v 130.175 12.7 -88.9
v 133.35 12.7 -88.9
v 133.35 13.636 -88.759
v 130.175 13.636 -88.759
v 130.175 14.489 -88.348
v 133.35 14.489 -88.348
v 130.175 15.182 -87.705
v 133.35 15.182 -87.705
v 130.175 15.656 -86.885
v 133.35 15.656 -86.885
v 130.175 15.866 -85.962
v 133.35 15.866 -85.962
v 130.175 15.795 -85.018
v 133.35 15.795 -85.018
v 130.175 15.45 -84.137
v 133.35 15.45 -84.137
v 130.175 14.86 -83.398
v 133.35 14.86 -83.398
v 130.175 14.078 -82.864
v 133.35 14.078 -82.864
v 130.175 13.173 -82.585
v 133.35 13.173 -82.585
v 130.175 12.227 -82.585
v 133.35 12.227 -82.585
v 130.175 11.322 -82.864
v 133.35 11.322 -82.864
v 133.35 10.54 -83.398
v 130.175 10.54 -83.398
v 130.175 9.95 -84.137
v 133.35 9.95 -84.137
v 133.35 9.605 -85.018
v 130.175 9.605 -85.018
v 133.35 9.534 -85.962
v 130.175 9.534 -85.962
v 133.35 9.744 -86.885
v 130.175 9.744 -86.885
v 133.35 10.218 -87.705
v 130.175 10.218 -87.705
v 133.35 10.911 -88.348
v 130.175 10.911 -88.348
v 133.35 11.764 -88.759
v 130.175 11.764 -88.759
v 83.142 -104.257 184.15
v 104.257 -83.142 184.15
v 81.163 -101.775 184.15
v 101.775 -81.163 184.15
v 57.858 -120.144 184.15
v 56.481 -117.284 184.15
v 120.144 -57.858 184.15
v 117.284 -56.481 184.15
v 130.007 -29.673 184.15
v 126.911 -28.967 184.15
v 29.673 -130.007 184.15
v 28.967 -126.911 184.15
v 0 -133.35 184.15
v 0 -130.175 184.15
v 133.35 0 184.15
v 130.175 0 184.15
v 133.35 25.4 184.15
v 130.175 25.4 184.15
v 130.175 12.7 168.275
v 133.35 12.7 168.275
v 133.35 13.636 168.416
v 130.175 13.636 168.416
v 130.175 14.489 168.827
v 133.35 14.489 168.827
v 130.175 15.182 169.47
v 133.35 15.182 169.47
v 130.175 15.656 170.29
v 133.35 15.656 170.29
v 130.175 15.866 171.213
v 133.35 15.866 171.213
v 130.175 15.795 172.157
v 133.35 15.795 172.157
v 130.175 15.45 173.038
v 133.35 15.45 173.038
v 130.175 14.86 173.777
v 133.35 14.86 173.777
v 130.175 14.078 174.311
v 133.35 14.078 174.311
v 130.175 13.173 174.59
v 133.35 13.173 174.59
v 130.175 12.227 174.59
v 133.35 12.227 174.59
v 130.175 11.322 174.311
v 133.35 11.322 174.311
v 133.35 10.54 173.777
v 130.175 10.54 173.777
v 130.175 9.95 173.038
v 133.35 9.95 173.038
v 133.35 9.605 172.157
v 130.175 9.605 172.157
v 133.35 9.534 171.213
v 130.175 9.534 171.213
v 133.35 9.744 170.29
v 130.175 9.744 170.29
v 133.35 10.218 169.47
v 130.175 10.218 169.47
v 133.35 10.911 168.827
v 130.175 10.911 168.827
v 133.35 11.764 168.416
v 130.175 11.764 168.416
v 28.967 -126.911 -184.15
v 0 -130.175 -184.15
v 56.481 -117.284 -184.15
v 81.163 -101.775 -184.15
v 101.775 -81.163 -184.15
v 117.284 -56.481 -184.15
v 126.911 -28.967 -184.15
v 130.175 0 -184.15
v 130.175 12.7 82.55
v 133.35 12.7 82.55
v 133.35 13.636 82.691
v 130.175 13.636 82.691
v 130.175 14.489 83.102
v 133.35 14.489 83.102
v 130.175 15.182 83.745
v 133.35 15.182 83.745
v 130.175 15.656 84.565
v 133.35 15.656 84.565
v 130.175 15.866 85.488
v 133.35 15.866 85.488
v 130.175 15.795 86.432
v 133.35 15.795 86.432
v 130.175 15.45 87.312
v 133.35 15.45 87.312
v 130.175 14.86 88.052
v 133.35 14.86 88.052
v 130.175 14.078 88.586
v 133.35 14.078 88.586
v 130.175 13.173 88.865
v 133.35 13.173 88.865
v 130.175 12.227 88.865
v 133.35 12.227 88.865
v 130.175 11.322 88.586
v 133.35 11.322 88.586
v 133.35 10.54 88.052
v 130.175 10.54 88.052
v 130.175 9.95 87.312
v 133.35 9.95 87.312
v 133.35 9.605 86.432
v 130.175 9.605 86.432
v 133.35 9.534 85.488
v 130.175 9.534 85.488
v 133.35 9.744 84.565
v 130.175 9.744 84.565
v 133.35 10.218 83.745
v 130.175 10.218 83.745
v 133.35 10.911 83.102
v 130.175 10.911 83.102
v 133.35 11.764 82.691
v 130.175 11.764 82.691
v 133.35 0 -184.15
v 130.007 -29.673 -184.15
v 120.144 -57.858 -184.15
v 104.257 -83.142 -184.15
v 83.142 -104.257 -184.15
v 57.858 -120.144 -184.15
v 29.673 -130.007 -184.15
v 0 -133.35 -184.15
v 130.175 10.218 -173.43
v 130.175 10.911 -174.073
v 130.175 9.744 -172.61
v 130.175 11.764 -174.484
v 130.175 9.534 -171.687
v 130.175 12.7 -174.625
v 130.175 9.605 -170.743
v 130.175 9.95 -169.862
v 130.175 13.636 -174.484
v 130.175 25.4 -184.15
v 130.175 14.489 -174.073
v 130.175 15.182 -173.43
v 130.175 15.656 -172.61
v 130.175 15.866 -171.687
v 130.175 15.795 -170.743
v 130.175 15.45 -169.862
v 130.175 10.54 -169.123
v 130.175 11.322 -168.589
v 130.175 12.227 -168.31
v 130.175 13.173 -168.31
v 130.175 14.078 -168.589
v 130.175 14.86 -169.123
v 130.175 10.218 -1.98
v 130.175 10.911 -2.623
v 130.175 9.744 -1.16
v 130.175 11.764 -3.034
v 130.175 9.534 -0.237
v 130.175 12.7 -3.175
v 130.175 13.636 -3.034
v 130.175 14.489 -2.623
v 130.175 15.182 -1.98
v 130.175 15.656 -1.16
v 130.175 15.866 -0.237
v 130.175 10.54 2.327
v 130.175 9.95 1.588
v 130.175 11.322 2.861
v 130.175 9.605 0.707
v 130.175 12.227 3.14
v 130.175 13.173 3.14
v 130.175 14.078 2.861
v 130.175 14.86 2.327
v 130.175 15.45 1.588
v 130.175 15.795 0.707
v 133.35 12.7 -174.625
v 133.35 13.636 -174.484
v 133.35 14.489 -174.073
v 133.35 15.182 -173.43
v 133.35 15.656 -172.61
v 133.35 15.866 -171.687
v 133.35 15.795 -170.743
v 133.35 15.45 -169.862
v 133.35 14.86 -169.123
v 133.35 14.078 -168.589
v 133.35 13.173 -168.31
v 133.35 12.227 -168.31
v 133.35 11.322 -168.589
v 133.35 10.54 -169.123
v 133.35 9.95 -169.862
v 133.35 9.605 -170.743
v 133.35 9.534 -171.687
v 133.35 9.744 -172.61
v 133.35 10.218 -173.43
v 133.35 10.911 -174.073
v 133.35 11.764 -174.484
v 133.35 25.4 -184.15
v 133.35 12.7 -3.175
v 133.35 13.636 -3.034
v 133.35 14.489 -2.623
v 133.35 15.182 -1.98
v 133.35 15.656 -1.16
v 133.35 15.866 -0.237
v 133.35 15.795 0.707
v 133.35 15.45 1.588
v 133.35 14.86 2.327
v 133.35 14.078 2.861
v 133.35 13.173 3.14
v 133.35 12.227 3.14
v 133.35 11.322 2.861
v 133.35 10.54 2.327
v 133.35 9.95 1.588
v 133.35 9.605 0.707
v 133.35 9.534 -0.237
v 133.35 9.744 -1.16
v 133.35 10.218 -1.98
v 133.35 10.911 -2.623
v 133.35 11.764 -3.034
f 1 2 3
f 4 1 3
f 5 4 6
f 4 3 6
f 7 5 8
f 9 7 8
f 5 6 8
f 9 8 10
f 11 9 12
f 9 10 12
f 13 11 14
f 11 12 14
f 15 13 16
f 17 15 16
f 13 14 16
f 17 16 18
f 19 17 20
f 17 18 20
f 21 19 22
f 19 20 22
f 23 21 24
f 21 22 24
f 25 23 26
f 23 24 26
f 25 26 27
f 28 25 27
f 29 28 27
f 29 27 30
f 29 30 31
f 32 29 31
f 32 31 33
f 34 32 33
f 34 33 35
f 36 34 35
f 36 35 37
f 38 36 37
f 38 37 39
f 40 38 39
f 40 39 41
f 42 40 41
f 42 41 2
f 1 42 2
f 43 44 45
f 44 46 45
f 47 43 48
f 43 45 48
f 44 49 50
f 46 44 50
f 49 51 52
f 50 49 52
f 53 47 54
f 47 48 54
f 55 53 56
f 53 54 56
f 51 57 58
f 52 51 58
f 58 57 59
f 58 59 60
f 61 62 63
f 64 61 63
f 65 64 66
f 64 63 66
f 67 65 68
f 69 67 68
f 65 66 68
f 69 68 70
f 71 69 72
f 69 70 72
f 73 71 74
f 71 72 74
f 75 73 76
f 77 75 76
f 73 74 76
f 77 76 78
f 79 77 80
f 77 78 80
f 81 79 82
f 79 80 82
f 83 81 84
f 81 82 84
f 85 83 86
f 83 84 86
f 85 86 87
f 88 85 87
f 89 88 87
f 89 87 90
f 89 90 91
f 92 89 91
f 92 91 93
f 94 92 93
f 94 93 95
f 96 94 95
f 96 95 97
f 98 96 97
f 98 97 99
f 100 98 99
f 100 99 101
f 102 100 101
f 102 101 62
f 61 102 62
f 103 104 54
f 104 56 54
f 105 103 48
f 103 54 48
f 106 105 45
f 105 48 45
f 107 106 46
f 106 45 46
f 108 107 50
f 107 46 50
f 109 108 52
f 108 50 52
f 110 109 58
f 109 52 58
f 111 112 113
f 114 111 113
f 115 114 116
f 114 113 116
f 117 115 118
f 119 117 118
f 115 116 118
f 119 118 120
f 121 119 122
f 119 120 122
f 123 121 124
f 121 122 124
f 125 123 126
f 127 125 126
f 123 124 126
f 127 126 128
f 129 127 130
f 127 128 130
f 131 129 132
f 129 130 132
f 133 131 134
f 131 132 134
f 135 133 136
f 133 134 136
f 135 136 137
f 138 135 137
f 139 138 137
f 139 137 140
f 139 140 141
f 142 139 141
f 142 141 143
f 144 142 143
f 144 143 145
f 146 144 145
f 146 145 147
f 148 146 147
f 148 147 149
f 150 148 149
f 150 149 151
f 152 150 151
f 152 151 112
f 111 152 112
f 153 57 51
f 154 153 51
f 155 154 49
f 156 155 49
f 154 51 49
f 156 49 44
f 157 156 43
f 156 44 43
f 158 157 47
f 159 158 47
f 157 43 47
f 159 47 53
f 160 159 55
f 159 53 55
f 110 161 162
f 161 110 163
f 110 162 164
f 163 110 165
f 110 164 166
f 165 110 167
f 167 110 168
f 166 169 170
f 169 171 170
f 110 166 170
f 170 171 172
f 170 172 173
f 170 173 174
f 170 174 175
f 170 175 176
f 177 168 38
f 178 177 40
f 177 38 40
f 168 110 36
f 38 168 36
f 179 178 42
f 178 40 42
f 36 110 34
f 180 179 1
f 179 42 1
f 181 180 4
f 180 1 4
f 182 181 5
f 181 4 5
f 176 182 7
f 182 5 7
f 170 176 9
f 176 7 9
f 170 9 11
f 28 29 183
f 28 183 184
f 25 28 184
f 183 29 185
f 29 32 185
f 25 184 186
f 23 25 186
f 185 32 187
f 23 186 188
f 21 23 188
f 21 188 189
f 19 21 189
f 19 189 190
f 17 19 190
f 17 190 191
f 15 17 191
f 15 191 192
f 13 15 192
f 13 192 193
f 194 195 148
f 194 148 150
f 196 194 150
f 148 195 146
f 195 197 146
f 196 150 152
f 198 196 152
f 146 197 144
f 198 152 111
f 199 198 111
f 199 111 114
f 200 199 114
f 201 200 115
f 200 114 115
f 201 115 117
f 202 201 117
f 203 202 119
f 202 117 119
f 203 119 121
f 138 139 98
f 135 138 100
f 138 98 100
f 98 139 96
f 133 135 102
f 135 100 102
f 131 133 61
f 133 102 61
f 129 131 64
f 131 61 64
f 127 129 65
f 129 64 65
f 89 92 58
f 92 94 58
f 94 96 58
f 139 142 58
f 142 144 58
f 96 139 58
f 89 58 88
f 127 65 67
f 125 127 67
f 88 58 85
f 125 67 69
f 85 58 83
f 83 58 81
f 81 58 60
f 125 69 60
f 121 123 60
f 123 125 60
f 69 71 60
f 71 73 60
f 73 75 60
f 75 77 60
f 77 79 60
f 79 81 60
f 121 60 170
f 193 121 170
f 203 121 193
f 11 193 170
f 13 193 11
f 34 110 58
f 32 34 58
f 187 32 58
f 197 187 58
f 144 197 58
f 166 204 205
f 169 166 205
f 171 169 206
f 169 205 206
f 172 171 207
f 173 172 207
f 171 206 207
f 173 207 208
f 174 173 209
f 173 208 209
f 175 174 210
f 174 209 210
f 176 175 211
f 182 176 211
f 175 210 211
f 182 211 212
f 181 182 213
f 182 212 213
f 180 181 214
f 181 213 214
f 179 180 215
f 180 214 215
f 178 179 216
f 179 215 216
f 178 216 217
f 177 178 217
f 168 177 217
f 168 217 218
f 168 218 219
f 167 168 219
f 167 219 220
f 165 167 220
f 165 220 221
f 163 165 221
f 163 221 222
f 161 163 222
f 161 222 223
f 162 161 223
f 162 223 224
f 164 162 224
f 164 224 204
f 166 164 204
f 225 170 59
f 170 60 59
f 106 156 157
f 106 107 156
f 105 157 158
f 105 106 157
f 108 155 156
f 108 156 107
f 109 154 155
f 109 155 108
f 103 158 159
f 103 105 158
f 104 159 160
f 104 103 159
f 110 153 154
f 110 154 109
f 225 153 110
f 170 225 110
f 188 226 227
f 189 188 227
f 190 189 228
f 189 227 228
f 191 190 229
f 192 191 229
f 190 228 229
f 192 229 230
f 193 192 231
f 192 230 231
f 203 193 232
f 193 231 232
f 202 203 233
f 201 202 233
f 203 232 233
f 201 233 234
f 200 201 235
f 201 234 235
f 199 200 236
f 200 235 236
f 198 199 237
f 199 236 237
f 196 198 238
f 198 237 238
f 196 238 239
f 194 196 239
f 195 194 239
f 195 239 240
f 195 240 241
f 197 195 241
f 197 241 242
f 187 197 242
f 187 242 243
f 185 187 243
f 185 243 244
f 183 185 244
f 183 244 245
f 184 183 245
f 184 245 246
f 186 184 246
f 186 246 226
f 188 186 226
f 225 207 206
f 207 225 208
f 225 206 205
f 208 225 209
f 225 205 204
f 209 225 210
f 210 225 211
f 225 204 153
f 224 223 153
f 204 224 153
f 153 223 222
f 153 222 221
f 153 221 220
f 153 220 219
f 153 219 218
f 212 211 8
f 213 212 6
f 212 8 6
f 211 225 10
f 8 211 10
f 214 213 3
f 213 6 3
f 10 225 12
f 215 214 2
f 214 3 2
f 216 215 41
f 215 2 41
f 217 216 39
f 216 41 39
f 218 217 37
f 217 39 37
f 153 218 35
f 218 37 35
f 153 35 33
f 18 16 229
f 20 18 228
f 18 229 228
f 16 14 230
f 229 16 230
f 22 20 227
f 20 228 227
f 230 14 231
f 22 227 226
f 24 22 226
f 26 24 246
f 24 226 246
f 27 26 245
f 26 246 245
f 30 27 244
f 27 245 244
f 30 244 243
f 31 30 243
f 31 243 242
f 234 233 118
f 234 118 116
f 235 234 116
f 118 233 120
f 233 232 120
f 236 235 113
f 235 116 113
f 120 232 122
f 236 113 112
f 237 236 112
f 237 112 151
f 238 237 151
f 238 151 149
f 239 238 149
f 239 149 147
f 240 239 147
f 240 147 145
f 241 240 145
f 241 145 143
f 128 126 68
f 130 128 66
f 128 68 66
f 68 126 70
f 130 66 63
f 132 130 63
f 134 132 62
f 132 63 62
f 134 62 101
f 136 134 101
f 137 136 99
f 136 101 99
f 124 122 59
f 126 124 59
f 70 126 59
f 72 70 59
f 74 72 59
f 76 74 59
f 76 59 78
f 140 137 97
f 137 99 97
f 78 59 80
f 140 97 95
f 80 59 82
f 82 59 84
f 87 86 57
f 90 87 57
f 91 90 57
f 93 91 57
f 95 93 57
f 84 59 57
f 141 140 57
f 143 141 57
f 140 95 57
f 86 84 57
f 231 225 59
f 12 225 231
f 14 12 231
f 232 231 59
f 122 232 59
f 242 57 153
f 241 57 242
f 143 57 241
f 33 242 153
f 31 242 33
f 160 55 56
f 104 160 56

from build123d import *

# Parameters (mm, degrees)
BOSS_EXTRUDE1_DEPTH = 184.15
SKETCH2_R           = 3.175
CUT_EXTRUDE1_DEPTH  = 381


with BuildPart() as part:
    # Sketch1 → Boss-Extrude1 (new body, symmetric)
    with BuildSketch(Plane.XY):
        with BuildLine():
            Line((0, -133.35), (0, -130.175))
            ThreePointArc((0, -130.175), (92.047625241, -92.047625241), (130.175, 0))
            Line((130.175, 0), (130.175, 25.4))
            Line((130.175, 25.4), (133.35, 25.4))
            Line((133.35, 25.4), (133.35, 0))
            ThreePointArc((133.35, 0), (94.292689271, -94.292689271), (0, -133.35))
        make_face()
    extrude(amount=BOSS_EXTRUDE1_DEPTH, both=True)

    # Sketch2 → Cut-Extrude1 (cut)
    with BuildSketch(Plane(origin=(133.35, 0, 0), x_dir=(0, 0, -1), z_dir=(1, 0, 0))):
        with Locations((0, 12.7)):
            Circle(SKETCH2_R)
        with Locations((85.725, 12.7)):
            Circle(SKETCH2_R)
        with Locations((-85.725, 12.7)):
            Circle(SKETCH2_R)
        with Locations((-171.45, 12.7)):
            Circle(SKETCH2_R)
        with Locations((171.45, 12.7)):
            Circle(SKETCH2_R)
    extrude(amount=-CUT_EXTRUDE1_DEPTH, mode=Mode.SUBTRACT)


solid = part.part
